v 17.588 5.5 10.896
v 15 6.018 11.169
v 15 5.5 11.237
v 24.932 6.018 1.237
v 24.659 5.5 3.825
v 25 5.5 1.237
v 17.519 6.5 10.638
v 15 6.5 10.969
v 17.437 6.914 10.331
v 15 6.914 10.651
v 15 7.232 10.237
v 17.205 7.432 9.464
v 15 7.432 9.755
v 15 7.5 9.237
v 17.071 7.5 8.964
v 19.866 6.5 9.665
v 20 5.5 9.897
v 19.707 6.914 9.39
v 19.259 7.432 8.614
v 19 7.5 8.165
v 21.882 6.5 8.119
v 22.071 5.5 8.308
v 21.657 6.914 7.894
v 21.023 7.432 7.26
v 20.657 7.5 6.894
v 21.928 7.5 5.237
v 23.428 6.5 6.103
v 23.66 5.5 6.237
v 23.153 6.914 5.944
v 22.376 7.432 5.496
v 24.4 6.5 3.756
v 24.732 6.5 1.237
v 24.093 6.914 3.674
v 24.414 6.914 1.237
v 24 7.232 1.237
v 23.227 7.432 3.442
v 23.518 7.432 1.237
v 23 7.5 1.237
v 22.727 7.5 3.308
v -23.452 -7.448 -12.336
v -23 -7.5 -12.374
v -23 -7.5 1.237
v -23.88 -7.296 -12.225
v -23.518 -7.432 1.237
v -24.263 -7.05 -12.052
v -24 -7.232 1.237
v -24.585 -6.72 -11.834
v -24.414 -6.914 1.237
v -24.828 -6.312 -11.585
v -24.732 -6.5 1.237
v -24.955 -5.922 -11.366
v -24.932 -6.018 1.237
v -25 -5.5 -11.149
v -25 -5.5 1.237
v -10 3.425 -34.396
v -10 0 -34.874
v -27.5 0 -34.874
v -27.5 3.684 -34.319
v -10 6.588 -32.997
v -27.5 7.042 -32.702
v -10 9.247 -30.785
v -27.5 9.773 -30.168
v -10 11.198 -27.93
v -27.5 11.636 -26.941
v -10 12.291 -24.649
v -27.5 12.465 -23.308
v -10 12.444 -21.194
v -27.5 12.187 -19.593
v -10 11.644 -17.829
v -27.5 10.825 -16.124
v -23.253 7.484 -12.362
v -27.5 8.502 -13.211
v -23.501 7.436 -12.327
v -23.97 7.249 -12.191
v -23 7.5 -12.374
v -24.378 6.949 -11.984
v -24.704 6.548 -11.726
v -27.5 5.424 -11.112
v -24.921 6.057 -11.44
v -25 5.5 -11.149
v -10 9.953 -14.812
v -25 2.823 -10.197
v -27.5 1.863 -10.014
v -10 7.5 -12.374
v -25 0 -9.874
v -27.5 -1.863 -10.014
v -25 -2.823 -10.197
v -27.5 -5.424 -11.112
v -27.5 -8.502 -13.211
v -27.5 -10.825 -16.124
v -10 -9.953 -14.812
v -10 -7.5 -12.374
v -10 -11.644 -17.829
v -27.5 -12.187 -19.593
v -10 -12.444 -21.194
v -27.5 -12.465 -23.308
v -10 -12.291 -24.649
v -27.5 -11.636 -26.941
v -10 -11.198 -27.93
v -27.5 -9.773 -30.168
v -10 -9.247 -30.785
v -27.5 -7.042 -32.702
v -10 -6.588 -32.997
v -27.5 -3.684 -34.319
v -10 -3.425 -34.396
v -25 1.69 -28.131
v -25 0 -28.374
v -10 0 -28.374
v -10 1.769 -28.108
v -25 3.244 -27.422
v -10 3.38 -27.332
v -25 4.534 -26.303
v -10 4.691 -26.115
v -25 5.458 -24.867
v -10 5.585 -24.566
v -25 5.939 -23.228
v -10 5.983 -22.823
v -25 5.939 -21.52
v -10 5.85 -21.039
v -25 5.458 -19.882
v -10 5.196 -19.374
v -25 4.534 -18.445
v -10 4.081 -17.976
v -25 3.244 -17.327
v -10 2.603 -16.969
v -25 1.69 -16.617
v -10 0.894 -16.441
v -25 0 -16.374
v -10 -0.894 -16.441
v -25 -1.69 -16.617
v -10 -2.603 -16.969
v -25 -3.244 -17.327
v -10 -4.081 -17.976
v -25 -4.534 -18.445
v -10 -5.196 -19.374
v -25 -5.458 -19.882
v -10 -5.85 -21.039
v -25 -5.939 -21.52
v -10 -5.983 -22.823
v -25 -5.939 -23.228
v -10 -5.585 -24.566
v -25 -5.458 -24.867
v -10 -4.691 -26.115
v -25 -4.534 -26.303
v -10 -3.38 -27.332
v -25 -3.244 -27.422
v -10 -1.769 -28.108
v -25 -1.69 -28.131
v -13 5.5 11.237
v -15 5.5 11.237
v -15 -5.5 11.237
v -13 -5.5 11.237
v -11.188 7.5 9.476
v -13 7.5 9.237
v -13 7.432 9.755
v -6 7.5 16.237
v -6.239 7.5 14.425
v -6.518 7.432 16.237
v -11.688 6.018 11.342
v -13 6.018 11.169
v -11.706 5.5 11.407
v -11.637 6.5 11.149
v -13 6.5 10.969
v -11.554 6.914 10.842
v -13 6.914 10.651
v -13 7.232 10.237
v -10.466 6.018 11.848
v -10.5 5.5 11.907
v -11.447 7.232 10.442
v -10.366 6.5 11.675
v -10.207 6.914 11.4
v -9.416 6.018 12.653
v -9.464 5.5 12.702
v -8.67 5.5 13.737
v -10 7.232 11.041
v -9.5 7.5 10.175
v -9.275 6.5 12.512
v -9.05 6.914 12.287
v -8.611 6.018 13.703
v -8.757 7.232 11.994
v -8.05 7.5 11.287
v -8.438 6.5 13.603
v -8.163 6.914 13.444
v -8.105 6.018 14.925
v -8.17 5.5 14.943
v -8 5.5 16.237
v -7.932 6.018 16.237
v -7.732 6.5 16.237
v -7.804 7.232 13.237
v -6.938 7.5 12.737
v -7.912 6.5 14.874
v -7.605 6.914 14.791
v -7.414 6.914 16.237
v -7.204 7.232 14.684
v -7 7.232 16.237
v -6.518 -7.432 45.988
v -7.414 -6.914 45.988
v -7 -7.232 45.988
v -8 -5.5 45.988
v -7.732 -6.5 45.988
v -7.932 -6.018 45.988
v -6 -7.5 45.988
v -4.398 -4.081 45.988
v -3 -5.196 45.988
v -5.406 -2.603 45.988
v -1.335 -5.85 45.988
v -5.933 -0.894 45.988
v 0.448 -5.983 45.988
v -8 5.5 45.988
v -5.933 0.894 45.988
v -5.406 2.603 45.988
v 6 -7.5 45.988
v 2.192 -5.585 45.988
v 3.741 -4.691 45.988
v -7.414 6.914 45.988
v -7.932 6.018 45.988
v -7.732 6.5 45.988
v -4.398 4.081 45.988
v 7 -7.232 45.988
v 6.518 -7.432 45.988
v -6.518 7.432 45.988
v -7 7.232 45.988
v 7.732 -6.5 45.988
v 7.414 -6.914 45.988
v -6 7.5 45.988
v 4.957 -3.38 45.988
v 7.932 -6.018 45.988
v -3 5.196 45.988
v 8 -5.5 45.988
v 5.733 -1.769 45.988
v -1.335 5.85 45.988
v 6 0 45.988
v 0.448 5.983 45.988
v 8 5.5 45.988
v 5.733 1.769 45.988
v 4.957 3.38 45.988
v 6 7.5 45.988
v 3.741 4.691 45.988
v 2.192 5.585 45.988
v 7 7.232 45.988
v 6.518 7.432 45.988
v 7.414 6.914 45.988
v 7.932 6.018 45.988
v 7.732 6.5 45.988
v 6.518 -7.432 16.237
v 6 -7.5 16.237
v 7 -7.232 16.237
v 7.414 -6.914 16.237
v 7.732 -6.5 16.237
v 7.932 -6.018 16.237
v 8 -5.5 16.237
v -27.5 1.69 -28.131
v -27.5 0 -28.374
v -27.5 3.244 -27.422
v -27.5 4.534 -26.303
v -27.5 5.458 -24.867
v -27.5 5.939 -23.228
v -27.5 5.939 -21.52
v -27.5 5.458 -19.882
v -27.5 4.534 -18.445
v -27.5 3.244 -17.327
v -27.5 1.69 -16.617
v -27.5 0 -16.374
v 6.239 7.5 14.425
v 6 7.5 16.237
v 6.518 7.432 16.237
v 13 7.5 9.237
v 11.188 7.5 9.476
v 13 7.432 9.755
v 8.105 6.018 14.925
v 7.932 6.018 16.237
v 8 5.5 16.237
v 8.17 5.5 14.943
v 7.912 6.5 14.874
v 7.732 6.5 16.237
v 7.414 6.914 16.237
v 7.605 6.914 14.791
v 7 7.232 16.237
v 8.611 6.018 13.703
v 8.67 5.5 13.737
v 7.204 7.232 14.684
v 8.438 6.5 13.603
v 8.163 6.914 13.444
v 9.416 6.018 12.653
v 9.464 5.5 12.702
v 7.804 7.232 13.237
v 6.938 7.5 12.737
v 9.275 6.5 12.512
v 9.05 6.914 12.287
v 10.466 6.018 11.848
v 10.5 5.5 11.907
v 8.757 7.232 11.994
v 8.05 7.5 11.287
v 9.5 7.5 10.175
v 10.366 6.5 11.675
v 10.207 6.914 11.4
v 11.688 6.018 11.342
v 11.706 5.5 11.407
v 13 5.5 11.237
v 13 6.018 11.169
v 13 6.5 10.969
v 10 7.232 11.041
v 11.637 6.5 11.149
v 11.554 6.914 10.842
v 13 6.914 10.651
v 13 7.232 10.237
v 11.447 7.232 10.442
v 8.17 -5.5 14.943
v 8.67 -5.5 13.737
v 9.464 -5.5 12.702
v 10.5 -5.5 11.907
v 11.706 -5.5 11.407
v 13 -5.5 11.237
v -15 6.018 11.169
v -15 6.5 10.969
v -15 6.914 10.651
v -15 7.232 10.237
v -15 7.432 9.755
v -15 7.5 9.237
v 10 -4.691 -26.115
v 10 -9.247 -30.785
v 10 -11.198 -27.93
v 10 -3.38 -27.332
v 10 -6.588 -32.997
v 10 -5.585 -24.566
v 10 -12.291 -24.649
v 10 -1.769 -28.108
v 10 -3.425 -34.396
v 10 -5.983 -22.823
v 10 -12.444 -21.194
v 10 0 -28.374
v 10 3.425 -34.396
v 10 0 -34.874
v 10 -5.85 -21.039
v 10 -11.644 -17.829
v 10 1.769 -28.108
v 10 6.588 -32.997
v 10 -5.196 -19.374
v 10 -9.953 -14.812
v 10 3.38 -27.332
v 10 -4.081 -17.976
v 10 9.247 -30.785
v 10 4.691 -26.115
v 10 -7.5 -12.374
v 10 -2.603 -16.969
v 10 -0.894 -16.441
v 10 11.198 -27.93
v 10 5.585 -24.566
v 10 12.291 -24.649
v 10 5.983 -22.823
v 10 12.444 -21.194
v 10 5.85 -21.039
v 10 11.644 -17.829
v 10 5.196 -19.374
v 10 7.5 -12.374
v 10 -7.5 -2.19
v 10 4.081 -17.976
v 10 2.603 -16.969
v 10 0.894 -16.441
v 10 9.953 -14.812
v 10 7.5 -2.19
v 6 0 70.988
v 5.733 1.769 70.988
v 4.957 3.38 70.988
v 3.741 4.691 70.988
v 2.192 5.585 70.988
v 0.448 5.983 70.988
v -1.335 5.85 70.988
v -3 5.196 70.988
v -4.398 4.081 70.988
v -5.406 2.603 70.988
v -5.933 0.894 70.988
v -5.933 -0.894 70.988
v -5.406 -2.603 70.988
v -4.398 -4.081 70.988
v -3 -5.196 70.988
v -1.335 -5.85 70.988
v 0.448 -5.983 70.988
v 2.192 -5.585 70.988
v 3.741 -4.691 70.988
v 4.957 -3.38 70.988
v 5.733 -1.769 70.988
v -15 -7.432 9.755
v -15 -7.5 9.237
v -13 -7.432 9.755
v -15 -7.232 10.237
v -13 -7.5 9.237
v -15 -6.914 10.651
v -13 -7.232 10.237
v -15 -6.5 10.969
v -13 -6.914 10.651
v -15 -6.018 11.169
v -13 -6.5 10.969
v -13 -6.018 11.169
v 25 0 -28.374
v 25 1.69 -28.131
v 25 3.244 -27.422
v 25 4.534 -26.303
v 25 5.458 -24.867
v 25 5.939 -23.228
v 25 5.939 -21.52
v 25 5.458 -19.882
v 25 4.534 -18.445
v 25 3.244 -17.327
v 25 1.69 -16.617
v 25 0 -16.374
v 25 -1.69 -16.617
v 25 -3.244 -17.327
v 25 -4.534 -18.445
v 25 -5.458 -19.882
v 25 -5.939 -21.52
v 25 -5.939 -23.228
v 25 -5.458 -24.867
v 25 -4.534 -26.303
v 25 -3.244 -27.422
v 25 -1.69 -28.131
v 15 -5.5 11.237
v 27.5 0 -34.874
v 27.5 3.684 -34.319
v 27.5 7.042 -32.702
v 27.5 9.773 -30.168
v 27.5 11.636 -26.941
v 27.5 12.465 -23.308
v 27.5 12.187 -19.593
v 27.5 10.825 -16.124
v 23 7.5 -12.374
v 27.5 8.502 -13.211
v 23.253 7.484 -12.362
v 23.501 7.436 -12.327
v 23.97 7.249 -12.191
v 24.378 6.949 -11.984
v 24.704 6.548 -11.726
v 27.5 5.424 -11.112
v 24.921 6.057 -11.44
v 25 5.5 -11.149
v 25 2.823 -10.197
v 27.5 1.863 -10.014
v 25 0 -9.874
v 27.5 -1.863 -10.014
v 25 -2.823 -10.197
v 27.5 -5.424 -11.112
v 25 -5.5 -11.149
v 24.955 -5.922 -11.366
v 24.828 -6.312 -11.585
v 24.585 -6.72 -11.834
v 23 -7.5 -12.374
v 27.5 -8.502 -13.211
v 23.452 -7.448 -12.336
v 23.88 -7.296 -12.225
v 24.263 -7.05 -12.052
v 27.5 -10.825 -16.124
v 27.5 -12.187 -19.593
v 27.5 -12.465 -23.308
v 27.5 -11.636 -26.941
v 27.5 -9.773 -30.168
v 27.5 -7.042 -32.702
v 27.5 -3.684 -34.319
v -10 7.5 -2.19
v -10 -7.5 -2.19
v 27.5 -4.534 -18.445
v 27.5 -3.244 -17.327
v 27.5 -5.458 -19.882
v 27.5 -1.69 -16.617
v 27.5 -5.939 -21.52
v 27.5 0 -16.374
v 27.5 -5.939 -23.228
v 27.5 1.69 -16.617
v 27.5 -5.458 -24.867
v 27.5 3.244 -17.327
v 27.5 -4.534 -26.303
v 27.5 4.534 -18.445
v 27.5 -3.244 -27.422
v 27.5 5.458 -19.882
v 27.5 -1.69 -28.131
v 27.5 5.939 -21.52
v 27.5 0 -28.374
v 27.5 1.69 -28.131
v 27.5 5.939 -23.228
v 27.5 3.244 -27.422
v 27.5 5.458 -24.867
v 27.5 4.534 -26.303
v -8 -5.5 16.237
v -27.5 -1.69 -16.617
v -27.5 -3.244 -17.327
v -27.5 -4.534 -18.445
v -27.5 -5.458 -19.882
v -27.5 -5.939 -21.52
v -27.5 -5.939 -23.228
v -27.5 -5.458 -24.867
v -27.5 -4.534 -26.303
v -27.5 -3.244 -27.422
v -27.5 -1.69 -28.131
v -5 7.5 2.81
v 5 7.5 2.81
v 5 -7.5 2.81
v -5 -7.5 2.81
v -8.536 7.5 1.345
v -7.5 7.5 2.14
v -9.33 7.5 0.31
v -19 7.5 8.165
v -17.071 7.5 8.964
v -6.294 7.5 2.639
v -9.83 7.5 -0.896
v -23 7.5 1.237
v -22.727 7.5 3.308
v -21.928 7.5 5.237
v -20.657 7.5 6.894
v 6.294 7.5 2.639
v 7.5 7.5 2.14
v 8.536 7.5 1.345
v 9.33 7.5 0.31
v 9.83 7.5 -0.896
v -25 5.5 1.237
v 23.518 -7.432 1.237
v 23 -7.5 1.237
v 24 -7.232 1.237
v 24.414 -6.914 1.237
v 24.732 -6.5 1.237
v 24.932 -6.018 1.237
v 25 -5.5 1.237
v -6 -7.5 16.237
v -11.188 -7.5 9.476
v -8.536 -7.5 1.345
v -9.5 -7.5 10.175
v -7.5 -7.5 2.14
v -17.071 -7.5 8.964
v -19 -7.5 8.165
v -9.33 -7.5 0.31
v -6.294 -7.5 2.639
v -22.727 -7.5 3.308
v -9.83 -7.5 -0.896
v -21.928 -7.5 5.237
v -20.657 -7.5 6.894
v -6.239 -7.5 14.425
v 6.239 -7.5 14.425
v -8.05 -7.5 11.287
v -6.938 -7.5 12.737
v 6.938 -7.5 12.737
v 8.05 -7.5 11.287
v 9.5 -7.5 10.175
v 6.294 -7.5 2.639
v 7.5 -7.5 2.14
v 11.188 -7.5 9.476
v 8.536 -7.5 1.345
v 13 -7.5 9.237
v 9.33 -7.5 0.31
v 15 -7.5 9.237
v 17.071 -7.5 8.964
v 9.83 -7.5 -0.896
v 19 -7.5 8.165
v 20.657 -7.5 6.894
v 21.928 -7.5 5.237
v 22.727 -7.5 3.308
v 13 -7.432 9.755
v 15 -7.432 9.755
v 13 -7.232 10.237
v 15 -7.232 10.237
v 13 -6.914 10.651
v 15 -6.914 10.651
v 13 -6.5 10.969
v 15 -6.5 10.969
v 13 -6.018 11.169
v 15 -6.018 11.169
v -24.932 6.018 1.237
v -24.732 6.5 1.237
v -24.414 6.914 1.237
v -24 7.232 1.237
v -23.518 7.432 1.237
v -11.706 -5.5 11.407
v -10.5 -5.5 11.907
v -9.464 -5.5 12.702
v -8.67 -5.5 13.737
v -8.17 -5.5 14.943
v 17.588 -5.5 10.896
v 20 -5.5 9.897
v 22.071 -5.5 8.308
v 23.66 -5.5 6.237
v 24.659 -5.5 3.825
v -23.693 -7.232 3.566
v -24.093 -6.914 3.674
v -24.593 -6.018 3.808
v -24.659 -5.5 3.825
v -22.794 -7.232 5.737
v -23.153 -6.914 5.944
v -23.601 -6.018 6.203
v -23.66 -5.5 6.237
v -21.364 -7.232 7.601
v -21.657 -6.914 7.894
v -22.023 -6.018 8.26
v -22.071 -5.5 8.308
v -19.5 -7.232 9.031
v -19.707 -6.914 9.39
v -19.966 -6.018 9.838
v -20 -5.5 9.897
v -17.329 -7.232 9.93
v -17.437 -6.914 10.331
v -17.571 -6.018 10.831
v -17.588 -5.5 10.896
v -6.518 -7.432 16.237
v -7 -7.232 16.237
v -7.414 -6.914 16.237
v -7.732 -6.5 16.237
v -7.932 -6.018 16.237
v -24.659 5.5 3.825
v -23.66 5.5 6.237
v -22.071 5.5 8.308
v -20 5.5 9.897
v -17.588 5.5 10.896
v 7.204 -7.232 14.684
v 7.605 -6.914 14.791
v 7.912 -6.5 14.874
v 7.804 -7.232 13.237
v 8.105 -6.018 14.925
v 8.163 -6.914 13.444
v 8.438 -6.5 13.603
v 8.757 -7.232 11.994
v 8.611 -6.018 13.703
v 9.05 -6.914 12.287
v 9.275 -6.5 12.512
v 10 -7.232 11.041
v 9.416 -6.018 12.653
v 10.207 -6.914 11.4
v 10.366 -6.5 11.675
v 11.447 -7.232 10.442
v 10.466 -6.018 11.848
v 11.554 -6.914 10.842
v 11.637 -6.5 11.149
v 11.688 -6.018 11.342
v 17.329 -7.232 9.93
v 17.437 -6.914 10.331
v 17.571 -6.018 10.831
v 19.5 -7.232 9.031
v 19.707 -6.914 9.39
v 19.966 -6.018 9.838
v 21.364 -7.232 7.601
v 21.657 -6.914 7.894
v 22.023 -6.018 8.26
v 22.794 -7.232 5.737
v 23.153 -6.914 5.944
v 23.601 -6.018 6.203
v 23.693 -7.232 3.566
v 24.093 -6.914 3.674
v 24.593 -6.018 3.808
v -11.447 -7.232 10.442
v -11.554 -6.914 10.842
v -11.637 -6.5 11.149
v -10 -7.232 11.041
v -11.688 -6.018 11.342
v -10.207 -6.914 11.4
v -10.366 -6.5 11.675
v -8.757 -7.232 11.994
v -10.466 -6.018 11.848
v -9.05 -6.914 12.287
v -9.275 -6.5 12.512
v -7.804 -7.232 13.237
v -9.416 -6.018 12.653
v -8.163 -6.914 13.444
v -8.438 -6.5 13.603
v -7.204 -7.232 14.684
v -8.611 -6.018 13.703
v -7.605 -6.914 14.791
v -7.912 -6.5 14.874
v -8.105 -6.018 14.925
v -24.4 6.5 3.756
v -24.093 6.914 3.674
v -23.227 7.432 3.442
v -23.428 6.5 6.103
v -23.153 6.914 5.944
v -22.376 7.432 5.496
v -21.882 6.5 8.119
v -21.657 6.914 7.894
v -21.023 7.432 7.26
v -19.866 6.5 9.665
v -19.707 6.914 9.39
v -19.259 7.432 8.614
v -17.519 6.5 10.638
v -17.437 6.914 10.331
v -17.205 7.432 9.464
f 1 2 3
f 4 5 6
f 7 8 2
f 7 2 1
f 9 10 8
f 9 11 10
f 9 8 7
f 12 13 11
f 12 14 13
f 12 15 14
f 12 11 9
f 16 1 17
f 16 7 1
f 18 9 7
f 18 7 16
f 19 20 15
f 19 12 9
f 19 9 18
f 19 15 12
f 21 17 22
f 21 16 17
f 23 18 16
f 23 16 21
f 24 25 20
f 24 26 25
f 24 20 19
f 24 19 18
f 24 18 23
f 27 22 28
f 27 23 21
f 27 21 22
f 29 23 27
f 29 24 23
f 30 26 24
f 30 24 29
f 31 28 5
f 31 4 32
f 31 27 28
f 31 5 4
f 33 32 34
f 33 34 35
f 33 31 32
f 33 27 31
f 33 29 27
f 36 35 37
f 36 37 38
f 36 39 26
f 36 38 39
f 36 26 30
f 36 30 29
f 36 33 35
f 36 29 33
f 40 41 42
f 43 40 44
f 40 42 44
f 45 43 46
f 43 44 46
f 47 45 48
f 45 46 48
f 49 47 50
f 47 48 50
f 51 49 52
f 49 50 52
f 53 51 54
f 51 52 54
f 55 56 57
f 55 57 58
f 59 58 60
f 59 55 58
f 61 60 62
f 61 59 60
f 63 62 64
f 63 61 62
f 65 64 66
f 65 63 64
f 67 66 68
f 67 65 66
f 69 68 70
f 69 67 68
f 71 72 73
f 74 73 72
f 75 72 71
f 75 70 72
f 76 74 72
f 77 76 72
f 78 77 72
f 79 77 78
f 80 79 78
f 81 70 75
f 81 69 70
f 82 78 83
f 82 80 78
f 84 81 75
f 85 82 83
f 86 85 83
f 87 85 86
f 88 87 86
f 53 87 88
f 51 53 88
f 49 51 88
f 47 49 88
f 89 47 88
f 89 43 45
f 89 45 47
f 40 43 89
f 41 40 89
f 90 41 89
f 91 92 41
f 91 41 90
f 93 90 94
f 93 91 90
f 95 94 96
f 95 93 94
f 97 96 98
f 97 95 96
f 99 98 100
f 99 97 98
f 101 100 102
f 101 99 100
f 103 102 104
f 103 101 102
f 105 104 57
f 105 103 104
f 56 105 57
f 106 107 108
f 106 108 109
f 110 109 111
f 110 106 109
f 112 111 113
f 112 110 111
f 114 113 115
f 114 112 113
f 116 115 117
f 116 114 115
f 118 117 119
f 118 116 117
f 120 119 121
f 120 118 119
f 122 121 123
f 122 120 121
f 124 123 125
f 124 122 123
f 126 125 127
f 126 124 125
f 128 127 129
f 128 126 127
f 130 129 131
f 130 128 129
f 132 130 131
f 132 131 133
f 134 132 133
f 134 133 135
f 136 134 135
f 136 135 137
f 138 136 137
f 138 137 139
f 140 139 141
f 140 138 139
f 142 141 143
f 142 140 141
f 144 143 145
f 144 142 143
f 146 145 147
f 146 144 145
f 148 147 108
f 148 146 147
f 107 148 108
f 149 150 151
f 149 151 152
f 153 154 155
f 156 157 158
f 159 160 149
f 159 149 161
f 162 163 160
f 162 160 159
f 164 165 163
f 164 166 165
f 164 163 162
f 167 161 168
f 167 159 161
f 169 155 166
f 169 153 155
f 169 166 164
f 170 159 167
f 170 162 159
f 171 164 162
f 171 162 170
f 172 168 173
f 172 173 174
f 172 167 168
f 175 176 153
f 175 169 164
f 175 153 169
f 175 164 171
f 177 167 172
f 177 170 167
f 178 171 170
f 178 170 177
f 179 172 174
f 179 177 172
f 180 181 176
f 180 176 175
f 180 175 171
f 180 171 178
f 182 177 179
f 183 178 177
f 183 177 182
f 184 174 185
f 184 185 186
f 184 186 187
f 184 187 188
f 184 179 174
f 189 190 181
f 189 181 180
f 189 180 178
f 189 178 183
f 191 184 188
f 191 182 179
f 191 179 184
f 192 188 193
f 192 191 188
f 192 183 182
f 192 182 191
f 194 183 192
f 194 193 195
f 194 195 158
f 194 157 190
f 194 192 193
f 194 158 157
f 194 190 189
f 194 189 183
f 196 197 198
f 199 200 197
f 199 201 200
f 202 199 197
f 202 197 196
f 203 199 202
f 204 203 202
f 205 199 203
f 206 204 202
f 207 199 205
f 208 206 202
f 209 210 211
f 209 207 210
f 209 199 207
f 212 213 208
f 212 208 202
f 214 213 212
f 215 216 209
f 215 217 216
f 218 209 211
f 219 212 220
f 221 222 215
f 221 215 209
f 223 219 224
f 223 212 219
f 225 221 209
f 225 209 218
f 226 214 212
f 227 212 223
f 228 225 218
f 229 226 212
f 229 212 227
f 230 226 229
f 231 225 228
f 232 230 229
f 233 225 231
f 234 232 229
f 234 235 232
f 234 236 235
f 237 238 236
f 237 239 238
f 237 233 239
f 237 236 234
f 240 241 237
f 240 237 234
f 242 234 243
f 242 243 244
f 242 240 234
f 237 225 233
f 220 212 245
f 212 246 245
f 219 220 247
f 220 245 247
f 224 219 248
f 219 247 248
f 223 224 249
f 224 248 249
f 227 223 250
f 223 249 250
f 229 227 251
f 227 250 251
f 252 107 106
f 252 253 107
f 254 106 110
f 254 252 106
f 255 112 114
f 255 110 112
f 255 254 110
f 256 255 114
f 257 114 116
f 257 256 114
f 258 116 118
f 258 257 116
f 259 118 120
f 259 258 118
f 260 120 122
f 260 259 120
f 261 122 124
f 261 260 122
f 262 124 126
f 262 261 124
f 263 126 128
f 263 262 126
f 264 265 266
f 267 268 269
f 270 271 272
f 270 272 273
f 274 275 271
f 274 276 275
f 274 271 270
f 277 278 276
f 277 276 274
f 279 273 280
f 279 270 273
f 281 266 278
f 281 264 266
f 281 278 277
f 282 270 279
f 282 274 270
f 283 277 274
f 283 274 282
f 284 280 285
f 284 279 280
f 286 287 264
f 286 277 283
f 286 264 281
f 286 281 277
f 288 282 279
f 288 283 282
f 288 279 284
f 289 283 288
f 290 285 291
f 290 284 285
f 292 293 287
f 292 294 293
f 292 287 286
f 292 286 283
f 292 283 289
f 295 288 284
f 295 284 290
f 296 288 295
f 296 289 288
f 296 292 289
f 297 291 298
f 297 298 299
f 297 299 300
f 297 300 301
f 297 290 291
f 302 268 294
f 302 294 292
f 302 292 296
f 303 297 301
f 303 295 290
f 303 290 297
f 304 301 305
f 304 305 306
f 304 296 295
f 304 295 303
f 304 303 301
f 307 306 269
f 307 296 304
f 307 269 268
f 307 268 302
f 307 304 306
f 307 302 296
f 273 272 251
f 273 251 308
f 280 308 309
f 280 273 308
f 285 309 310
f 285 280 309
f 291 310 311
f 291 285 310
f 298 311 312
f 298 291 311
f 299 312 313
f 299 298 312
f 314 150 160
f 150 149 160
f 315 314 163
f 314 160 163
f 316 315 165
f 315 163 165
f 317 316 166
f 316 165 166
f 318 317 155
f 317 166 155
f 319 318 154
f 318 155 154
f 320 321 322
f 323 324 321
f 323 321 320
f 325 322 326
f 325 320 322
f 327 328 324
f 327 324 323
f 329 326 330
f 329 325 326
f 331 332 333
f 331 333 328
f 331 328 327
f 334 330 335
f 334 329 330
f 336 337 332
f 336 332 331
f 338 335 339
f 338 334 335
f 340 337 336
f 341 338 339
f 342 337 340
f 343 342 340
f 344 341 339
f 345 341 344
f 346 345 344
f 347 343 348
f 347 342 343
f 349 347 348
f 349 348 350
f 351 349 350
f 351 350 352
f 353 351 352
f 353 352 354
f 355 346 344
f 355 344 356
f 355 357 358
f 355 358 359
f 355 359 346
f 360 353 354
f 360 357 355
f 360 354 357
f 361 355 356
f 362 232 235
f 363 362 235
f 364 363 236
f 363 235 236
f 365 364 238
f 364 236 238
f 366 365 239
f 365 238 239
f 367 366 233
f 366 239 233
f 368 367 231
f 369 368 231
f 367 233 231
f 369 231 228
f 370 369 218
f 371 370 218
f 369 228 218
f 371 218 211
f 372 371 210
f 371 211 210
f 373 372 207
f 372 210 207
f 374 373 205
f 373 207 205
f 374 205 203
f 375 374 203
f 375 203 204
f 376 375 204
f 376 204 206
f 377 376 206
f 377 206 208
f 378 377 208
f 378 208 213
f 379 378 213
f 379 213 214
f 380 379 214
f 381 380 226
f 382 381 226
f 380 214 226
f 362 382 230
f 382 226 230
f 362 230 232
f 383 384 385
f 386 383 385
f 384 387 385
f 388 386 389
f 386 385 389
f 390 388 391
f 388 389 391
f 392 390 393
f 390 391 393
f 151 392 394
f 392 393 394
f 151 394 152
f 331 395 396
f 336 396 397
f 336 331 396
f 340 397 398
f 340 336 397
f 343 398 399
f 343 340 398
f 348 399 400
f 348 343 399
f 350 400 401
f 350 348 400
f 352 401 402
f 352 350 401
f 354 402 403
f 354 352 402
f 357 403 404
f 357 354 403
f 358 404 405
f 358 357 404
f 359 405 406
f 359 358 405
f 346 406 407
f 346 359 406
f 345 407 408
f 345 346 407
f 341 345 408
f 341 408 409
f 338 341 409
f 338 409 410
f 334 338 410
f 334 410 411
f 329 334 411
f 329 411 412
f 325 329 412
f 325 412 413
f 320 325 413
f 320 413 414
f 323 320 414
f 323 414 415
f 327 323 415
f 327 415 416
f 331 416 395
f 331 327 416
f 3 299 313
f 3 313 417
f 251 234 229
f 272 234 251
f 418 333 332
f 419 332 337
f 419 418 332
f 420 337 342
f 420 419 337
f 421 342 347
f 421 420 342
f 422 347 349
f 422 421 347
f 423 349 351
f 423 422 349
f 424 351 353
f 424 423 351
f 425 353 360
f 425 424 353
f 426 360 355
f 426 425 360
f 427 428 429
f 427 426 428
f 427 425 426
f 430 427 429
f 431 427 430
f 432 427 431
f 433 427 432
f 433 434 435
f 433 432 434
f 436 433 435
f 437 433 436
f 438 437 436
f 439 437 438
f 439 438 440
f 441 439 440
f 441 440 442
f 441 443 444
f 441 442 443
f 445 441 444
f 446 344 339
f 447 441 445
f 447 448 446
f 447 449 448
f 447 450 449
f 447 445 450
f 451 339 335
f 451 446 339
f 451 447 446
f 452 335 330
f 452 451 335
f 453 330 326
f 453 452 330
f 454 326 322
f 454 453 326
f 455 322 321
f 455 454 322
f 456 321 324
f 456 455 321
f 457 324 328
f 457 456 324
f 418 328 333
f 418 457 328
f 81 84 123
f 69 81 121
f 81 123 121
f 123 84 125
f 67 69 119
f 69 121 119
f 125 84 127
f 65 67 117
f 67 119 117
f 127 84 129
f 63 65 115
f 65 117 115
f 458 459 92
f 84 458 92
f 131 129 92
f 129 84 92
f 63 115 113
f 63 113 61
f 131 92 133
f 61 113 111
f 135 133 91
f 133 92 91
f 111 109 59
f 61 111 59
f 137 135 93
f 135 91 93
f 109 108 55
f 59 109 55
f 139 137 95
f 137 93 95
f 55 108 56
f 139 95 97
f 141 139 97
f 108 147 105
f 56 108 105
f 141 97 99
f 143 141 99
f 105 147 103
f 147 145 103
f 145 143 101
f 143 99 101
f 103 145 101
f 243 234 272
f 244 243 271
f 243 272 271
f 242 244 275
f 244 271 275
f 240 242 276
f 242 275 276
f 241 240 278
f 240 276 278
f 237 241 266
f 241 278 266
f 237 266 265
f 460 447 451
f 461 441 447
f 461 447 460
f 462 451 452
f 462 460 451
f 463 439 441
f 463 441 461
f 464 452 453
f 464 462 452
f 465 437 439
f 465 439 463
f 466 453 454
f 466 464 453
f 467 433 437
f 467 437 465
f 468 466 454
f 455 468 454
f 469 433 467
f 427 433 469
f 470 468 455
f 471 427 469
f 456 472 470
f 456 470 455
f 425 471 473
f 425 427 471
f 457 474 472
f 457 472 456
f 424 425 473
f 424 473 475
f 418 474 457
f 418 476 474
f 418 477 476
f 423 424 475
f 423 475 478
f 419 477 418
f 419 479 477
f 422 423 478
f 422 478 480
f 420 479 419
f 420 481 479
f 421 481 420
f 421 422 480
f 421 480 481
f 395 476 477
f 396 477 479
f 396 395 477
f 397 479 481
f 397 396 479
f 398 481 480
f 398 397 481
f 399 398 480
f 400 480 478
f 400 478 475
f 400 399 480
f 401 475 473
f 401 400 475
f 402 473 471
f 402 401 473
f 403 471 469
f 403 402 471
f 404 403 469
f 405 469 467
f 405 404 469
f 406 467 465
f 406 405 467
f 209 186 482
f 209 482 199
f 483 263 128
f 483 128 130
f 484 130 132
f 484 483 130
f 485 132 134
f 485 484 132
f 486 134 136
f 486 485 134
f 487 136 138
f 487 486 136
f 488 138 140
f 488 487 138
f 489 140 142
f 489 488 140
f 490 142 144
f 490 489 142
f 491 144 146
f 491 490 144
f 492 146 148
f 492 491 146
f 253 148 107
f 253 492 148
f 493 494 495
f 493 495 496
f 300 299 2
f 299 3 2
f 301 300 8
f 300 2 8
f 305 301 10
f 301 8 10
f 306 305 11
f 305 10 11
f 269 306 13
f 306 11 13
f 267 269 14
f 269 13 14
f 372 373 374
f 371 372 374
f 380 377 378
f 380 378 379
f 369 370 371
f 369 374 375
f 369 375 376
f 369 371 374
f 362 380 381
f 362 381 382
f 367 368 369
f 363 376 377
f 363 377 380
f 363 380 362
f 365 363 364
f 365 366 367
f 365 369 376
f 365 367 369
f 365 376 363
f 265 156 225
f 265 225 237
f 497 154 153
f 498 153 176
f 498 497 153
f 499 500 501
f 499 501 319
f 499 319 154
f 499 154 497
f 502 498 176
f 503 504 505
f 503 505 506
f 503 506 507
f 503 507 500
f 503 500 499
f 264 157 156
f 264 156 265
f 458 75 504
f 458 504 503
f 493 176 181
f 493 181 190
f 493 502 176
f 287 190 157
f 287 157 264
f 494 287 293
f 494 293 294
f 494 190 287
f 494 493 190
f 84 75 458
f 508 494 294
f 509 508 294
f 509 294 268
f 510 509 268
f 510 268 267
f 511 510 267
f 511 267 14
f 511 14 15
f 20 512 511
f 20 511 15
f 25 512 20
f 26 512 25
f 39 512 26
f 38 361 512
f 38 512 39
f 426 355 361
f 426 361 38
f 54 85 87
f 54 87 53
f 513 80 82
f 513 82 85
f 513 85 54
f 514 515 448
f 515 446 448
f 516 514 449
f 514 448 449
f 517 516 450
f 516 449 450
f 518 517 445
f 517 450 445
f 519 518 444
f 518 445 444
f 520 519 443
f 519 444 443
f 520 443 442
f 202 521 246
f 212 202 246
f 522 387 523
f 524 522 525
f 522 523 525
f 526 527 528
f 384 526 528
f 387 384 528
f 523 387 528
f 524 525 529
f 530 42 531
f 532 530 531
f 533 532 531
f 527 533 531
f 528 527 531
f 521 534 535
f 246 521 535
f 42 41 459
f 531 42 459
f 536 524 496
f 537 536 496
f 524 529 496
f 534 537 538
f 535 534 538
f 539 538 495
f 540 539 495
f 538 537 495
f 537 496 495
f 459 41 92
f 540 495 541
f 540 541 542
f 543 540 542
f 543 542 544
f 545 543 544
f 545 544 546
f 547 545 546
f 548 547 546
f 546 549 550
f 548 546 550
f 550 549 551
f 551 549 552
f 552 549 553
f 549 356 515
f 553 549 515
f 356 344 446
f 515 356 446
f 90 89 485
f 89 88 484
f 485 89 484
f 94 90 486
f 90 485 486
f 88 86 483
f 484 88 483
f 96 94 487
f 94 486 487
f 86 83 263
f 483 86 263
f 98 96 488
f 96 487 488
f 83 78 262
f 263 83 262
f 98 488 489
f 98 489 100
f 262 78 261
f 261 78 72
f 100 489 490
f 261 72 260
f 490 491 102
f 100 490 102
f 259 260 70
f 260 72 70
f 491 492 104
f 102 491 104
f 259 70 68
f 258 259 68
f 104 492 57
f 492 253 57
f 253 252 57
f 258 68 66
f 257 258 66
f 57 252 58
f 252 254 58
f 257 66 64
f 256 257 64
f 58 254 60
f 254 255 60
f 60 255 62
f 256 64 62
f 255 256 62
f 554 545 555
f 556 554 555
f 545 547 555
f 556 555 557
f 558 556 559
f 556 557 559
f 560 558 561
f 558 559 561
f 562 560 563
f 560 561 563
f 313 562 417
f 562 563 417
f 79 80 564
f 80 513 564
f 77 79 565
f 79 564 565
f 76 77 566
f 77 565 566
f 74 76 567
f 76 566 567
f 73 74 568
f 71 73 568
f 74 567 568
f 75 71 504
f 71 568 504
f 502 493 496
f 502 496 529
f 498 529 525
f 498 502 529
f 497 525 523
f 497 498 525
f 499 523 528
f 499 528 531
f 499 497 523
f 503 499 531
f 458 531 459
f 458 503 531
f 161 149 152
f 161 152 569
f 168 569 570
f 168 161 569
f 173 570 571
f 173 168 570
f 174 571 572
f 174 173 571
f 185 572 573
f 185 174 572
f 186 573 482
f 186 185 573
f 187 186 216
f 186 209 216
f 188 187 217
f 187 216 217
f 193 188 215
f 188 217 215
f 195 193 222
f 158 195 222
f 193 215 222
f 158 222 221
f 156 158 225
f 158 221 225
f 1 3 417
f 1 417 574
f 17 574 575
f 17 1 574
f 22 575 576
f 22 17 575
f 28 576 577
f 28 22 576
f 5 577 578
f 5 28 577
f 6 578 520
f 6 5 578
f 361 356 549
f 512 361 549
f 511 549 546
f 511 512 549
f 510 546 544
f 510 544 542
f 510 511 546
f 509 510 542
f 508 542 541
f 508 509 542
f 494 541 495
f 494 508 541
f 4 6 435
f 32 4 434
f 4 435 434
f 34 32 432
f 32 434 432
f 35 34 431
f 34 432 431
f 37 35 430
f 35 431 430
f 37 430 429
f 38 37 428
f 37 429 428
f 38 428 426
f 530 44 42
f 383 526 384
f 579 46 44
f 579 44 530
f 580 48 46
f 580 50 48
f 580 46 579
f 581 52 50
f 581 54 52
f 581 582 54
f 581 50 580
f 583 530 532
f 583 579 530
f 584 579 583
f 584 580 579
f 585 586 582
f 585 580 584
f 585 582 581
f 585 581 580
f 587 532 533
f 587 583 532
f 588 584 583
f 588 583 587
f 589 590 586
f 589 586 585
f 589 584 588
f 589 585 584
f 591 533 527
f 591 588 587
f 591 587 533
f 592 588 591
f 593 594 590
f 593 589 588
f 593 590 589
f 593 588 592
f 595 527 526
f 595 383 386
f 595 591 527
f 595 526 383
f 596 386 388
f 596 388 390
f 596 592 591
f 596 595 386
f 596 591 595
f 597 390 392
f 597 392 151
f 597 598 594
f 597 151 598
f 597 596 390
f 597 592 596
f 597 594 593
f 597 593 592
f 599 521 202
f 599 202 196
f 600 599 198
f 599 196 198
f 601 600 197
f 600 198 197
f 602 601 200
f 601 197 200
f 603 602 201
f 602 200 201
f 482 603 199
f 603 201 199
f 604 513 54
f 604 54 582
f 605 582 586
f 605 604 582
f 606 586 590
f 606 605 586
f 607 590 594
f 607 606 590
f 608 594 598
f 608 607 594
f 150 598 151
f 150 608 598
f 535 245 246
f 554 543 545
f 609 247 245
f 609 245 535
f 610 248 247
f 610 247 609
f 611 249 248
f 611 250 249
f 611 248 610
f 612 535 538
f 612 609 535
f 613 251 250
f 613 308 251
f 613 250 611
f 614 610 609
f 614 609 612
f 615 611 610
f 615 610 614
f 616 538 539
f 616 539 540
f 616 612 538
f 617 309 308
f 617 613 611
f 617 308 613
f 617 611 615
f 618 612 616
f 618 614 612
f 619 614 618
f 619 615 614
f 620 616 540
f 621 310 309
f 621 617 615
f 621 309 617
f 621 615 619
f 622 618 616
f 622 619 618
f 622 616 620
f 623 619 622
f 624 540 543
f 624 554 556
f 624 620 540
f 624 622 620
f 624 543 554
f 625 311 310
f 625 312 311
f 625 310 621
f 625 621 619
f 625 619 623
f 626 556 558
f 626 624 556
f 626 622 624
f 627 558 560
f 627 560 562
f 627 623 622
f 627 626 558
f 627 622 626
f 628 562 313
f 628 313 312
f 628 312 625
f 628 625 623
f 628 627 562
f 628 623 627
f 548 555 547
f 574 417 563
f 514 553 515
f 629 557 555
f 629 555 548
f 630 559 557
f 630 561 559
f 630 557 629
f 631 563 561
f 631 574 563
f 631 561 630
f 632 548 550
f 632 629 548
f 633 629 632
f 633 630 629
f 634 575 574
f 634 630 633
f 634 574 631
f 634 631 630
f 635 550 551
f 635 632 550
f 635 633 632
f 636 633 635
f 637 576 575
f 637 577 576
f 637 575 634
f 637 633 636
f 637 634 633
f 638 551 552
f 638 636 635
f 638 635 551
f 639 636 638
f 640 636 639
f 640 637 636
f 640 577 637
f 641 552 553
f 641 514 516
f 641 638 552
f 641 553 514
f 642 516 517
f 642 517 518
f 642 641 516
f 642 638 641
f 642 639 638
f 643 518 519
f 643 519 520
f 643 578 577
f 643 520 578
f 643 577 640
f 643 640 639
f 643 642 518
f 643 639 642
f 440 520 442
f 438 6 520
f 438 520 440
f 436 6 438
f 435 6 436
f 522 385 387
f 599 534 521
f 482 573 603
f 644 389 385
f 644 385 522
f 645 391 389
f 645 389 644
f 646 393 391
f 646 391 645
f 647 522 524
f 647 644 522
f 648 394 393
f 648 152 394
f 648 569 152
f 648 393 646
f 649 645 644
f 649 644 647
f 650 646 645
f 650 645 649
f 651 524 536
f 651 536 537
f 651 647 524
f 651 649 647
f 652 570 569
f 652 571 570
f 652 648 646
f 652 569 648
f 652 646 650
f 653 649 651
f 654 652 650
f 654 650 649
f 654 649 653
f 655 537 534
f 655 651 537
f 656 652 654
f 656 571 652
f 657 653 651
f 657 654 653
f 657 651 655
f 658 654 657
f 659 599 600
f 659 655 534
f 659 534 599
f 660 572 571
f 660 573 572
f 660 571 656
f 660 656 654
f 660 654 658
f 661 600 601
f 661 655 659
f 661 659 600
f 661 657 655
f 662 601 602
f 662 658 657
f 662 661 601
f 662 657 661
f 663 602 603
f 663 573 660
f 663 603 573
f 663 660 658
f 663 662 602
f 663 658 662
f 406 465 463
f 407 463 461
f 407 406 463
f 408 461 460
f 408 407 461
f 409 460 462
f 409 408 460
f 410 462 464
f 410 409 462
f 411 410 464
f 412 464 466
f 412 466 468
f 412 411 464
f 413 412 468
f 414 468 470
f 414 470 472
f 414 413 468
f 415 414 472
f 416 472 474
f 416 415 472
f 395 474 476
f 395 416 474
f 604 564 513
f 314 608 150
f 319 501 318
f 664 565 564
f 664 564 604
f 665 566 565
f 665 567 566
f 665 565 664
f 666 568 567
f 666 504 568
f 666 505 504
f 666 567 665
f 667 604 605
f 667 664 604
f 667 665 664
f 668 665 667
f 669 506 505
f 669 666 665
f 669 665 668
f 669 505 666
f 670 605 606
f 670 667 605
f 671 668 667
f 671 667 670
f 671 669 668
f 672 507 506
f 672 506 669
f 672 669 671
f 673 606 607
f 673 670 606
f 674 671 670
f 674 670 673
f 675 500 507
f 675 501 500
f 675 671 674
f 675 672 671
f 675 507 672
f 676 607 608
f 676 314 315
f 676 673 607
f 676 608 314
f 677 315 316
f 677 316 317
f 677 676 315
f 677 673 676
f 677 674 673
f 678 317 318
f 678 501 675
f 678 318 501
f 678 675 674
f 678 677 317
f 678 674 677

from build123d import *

# Parameters (mm, degrees)
BOSS_EXTRUDE1_DEPTH     = 7.5
SKETCH2_R               = 12.5
SKETCH2_R_2             = 6
BOSS_EXTRUDE2_DEPTH     = 27.5
CUT_EXTRUDE1_DEPTH      = 56.021489892
CUT_EXTRUDE1_DEPTH_BACK = 56.021489892
SKETCH2_3_R             = 6
CUT_EXTRUDE2_DEPTH      = 56.021489892
CUT_EXTRUDE2_DEPTH_BACK = 56.021489892
SKETCH3_W               = 20
SKETCH3_H               = 27.591963828
FILLET1_R               = 2
SKETCH4_R               = 6
BOSS_EXTRUDE3_DEPTH     = 25


with BuildPart() as part:
    # Sketch1 → Boss-Extrude1 (new, symmetric)
    with BuildSketch(Plane(origin=(0, 0, 0), x_dir=(1, 0, 0), z_dir=(0, 1, 0))):
        with BuildLine():
            Line((13, -11.237079071), (15, -11.237079071))
            ThreePointArc((15, -11.237079071), (22.071067812, -8.308146883), (25, -1.237079071))
            Line((25, -1.237079071), (25, 2.345679012))
            Line((25, 2.345679012), (25, 30))
            Line((25, 30), (10, 30))
            Line((10, 30), (10, 2.190396801))
            ThreePointArc((10, 2.190396801), (8.535533906, -1.345137105), (5, -2.809603199))
            Line((5, -2.809603199), (-5, -2.809603199))
            ThreePointArc((-5, -2.809603199), (-8.535533906, -1.345137105), (-10, 2.190396801))
            Line((-10, 2.190396801), (-10, 30))
            Line((-10, 30), (-25, 30))
            Line((-25, 30), (-25, 2.345679012))
            Line((-25, 2.345679012), (-25, -1.237079071))
            ThreePointArc((-25, -1.237079071), (-22.071067812, -8.308146883), (-15, -11.237079071))
            Line((-15, -11.237079071), (-13, -11.237079071))
            ThreePointArc((-13, -11.237079071), (-9.464466094, -12.701545165), (-8, -16.237079071))
            Line((-8, -16.237079071), (-8, -45.987654321))
            Line((-8, -45.987654321), (8, -45.987654321))
            Line((8, -45.987654321), (8, -16.237079071))
            ThreePointArc((8, -16.237079071), (9.464466094, -12.701545165), (13, -11.237079071))
        make_face()
    extrude(amount=BOSS_EXTRUDE1_DEPTH, both=True)

    # Sketch2 → Boss-Extrude2 (add, symmetric)
    with BuildSketch(Plane(origin=(0, 0, 0), x_dir=(0, 0, -1), z_dir=(1, 0, 0))):
        with Locations((22.374324457, 0)):
            Circle(SKETCH2_R)
        with Locations((22.374324457, 0)):
            Circle(SKETCH2_R_2, mode=Mode.SUBTRACT)
    extrude(amount=BOSS_EXTRUDE2_DEPTH, both=True)

    # Sketch2<3> → Cut-Extrude1 (cut, two sides: drawn at the far end of the back side and taken through both)
    with BuildSketch(Plane(origin=(0, 0, 0), x_dir=(0, 0, -1), z_dir=(1, 0, 0)).offset(-CUT_EXTRUDE1_DEPTH_BACK)):
        with Locations((22.374324457, 0)):
            Circle(SKETCH2_3_R)
    extrude(amount=CUT_EXTRUDE1_DEPTH + CUT_EXTRUDE1_DEPTH_BACK, mode=Mode.SUBTRACT)

    # Sketch3 → Cut-Extrude2 (cut, two sides: drawn at the far end of the back side and taken through both)
    with BuildSketch(Plane(origin=(0, 0, 0), x_dir=(1, 0, 0), z_dir=(0, 1, 0)).offset(-CUT_EXTRUDE2_DEPTH_BACK)):
        with Locations((0, 21.078342543)):
            Rectangle(SKETCH3_W, SKETCH3_H)
    extrude(amount=CUT_EXTRUDE2_DEPTH + CUT_EXTRUDE2_DEPTH_BACK, mode=Mode.SUBTRACT)

    # Fillet1
    fillet1_edges = [part.edges().sort_by_distance(p)[0] for p in [
        (-25, -7.5, -5.568622693),
        (-8, -7.5, 31.112366696),
        (-9.464466094, -7.5, 12.701545165),
        (-14, -7.5, 11.237079071),
        (8, -7.5, 31.112366696),
        (9.464466094, -7.5, 12.701545165),
        (14, -7.5, 11.237079071),
        (25, -7.5, -5.568622693),
        (-25, 7.5, -5.568622693),
        (-8, 7.5, 31.112366696),
        (-9.464466094, 7.5, 12.701545165),
        (-14, 7.5, 11.237079071),
        (8, 7.5, 31.112366696),
        (9.464466094, 7.5, 12.701545165),
        (14, 7.5, 11.237079071),
        (25, 7.5, -5.568622693),
        (-22.071067812, -7.5, 8.308146883),
        (22.071067812, -7.5, 8.308146883),
        (-22.071067812, 7.5, 8.308146883),
        (22.071067812, 7.5, 8.308146883),
    ]]
    fillet(fillet1_edges, radius=FILLET1_R)

    # Sketch4 → Boss-Extrude3 (add)
    with BuildSketch(Plane.XY.offset(45.987654321)):
        Circle(SKETCH4_R)
    extrude(amount=BOSS_EXTRUDE3_DEPTH)


solid = part.part
